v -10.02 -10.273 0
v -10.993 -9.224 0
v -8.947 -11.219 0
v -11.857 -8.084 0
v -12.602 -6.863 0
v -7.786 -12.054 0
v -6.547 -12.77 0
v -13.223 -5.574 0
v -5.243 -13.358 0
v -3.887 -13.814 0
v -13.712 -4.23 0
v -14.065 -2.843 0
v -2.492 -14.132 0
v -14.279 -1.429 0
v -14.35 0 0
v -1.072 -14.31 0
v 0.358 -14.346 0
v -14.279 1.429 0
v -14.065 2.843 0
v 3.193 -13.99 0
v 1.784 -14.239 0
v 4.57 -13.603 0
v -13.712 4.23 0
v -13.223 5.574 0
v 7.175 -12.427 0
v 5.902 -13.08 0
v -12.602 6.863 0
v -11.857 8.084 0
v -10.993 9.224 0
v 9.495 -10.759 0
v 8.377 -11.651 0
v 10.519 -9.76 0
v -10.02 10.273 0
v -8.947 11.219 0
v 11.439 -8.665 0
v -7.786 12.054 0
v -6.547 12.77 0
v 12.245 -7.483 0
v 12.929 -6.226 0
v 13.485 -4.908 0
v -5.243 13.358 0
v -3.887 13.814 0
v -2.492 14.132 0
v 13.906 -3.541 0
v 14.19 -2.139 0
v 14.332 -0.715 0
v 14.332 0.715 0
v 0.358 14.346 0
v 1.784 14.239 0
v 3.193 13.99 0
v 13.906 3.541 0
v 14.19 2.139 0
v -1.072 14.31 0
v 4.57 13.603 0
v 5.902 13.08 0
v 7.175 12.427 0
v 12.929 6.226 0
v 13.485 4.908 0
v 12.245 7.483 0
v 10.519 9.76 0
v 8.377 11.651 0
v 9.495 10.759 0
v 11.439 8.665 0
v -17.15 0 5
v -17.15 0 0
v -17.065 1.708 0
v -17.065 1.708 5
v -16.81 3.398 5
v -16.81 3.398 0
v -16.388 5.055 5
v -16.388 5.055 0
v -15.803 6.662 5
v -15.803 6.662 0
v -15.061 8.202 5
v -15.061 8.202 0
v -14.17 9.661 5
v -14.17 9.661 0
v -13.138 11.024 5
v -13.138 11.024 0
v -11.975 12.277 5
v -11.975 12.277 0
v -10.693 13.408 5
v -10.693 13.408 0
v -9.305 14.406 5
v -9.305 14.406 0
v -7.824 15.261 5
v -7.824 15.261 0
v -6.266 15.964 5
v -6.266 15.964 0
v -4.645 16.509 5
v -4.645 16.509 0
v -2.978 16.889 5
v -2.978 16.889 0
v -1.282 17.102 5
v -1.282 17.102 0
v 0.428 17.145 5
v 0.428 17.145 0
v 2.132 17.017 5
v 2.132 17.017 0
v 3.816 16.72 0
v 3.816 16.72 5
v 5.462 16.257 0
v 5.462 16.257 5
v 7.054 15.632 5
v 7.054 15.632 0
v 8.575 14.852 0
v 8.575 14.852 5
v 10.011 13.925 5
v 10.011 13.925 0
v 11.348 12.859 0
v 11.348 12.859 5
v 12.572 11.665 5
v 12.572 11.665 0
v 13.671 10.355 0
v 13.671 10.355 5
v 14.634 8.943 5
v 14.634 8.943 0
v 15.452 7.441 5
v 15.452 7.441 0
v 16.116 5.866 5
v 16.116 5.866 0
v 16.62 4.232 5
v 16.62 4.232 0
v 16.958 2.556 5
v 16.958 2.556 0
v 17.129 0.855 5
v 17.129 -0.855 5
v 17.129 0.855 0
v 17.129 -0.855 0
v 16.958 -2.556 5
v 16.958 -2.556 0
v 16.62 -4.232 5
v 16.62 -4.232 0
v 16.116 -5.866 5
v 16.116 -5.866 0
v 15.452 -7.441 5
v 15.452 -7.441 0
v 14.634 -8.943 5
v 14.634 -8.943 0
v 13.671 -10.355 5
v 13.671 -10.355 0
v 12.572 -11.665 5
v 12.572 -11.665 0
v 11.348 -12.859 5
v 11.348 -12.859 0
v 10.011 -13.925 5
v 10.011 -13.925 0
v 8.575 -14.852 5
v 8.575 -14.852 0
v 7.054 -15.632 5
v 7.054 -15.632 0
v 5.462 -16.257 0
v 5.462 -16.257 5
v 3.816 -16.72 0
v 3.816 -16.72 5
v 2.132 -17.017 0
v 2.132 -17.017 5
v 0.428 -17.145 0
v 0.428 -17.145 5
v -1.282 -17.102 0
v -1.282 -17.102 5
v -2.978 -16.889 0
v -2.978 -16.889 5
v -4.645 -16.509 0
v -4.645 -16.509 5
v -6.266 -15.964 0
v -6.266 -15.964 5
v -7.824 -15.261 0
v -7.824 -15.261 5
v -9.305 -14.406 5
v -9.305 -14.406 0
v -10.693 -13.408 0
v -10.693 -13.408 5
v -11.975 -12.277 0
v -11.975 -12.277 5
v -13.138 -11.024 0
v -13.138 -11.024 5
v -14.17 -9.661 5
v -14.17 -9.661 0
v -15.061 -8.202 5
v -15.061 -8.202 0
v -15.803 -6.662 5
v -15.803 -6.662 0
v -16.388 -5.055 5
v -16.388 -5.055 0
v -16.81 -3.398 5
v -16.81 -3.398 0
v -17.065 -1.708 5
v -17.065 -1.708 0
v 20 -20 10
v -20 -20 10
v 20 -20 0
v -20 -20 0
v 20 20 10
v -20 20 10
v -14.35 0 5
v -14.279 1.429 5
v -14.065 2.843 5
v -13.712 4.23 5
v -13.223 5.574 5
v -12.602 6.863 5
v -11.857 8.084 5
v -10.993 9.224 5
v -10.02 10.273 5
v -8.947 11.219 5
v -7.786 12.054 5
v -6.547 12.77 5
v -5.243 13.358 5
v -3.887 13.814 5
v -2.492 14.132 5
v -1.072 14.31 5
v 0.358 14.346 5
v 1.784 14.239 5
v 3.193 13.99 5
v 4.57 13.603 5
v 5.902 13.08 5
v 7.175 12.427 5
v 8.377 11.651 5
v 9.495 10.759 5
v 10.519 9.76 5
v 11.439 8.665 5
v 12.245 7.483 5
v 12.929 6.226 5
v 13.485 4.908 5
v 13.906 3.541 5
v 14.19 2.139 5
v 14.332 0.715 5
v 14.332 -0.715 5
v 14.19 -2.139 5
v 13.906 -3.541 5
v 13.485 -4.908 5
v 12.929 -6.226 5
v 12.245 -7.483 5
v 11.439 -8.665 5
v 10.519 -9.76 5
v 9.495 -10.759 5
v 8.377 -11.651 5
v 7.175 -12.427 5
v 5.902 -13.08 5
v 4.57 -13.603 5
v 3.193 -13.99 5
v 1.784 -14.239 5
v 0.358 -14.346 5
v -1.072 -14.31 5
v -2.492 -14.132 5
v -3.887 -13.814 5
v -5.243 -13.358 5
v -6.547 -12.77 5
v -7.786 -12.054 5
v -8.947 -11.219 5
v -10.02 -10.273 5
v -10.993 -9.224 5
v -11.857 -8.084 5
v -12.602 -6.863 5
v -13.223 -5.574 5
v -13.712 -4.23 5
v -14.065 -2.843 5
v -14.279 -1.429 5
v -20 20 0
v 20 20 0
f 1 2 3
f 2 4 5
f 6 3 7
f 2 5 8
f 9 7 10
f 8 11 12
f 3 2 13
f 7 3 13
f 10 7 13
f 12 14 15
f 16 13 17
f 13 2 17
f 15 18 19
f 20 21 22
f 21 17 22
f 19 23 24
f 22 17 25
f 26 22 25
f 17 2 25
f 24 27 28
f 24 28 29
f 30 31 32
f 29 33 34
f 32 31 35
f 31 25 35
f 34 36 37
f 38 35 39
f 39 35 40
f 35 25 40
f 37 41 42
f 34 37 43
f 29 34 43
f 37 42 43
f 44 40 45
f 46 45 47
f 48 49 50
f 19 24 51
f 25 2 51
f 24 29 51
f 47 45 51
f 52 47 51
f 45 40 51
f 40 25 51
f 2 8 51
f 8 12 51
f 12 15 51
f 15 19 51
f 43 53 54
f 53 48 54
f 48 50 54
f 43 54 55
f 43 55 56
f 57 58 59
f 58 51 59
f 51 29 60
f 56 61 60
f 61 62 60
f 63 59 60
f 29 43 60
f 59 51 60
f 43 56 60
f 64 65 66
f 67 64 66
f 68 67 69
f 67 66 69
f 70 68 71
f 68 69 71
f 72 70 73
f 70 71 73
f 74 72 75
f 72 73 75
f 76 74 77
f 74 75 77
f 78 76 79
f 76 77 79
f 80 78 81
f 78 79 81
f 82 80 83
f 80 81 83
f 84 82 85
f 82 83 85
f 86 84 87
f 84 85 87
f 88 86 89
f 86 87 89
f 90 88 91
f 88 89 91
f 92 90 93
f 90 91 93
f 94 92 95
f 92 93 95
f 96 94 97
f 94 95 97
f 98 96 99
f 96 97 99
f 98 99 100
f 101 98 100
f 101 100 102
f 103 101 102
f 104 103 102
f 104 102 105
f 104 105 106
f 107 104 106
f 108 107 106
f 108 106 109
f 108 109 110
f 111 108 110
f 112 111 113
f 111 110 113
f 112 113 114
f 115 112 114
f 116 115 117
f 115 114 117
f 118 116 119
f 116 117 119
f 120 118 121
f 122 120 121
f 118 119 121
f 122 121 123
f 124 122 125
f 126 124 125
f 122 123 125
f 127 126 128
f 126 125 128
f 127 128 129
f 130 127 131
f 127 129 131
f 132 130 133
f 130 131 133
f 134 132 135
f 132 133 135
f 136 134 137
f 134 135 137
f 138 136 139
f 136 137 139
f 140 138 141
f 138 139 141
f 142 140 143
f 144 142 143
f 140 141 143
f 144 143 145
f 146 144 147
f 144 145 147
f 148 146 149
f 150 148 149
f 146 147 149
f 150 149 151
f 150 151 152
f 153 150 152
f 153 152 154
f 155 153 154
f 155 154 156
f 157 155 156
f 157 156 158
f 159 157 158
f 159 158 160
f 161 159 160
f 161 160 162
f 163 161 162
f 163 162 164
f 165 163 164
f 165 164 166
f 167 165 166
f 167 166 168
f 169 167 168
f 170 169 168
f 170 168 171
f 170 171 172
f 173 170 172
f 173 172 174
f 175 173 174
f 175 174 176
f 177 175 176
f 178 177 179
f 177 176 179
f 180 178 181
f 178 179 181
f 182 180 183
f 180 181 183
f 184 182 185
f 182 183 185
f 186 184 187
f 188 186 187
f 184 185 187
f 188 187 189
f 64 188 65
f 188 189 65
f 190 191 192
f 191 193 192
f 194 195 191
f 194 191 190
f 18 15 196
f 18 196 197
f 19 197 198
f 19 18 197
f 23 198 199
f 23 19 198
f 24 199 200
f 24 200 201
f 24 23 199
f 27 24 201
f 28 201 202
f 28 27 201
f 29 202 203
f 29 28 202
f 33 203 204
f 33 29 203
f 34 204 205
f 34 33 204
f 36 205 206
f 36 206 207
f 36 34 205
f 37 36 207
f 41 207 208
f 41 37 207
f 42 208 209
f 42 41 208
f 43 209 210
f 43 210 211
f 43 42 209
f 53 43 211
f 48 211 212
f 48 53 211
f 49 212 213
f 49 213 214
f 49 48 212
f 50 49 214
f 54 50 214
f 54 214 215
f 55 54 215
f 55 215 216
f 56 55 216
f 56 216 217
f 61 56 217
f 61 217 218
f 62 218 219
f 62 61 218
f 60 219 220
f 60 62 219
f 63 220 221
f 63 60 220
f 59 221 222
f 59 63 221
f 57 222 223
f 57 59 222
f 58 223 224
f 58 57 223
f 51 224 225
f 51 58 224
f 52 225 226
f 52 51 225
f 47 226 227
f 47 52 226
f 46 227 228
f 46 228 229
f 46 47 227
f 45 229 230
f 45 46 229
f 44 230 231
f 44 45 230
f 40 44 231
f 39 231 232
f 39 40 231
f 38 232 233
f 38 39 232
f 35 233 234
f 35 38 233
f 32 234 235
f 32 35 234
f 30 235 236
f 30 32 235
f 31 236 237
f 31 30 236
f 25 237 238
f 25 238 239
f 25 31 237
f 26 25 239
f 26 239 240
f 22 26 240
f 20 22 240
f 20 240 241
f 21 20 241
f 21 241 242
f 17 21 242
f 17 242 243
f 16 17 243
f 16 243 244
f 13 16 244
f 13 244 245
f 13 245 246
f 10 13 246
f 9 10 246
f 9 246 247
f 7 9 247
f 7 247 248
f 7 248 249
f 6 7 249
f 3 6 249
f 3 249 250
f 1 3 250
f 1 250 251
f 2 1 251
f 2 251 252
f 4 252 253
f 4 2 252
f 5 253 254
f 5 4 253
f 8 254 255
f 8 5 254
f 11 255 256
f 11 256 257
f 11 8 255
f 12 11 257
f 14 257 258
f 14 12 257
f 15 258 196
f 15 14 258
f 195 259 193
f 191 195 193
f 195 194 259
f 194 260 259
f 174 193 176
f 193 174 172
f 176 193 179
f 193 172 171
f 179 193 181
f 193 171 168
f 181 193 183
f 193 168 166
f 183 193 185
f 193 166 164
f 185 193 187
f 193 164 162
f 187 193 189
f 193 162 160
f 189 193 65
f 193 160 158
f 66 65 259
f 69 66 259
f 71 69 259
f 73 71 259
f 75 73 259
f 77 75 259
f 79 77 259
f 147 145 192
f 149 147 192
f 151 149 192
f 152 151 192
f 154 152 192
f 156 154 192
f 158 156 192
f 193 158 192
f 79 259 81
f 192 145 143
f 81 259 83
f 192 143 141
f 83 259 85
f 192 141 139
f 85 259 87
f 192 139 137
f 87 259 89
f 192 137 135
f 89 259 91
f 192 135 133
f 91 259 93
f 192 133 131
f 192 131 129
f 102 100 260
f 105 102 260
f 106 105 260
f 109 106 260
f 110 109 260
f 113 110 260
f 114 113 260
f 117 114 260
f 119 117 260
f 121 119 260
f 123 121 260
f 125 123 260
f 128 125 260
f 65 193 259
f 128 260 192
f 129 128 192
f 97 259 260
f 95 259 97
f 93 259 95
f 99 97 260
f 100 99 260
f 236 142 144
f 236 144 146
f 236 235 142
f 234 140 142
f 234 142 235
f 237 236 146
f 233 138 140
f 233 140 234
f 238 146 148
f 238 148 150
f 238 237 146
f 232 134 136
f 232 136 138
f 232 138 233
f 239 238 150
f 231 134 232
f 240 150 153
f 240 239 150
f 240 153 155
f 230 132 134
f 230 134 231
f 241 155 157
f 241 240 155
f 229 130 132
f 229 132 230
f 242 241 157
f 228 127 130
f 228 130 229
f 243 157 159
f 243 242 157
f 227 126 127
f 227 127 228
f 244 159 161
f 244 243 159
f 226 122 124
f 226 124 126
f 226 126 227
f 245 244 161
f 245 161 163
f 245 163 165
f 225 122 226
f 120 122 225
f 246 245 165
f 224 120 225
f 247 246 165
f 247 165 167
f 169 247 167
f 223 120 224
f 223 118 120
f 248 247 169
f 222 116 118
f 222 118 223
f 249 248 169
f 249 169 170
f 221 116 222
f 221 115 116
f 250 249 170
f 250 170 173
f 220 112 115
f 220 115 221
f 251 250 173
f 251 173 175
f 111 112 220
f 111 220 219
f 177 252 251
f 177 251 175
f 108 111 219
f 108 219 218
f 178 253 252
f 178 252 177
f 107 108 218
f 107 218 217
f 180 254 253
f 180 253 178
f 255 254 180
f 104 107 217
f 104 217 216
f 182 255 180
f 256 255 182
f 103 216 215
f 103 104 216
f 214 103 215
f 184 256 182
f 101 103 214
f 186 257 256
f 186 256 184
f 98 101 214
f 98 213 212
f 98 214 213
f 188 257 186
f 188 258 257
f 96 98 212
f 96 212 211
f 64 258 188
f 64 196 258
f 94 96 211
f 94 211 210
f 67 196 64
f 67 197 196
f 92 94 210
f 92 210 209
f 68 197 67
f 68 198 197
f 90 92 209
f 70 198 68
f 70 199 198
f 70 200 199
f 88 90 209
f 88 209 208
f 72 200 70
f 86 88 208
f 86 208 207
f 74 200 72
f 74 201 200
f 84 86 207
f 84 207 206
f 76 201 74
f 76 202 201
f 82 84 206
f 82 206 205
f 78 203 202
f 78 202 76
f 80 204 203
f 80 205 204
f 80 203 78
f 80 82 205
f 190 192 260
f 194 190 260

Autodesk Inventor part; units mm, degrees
ref_plane "YZ Plane" through (0, 0, 0) normal (1, 0, 0) x (0, 1, 0)
ref_plane "XZ Plane" through (0, 0, 0) normal (0, 1, 0) x (-1, 0, 0)
ref_plane "XY Plane" through (0, 0, 0) normal (0, 0, 1) x (1, 0, 0)
sketch "Sketch5" plane through (0, 0, 0) normal (0, 0, 1) x (1, 0, 0)
  circle A0 centre (0, 0) radius 14.35
  circle A1 centre (0, 0) radius 17.15
  line L0 (0, 0) -> (20, 0)
  line L1 (20, 0) -> (20, 20)
  line L2 (20, 20) -> (0, 20)
  line L3 (0, 20) -> (0, 0)
  line L4 (20, 20) -> (-20, 20)
  line L5 (-20, 20) -> (-20, -20)
  line L6 (-20, -20) -> (20, -20)
  line L7 (20, -20) -> (20, 20)
  dimension "d36" = 28.7
  dimension "d37" = 34.3
  dimension "d54" = 20
  dimension "d55" = 20
  dimension "d56" = 40
  dimension "d57" = 40
extrude "Extrusion10" add sketch "Sketch5" along normal blind 10
sketch "Sketch8" plane through (0, 0, 0) normal (0, 0, -1) x (-1, 0, 0)
  circle A0 centre (0, 0) radius 14.35
  circle A1 centre (0, 0) radius 17.15
  circle A2 centre (0, 0) radius 14.35
  circle A3 centre (0, 0) radius 17.15
  dimension "d60" = 28.7
  dimension "d61" = 34.3
  dimension "d62" = 28.7
  dimension "d63" = 34.3
extrude "Extrusion11" cut sketch "Sketch8" against normal blind 5
properties part number "Clip_MarkerHolderV1"
